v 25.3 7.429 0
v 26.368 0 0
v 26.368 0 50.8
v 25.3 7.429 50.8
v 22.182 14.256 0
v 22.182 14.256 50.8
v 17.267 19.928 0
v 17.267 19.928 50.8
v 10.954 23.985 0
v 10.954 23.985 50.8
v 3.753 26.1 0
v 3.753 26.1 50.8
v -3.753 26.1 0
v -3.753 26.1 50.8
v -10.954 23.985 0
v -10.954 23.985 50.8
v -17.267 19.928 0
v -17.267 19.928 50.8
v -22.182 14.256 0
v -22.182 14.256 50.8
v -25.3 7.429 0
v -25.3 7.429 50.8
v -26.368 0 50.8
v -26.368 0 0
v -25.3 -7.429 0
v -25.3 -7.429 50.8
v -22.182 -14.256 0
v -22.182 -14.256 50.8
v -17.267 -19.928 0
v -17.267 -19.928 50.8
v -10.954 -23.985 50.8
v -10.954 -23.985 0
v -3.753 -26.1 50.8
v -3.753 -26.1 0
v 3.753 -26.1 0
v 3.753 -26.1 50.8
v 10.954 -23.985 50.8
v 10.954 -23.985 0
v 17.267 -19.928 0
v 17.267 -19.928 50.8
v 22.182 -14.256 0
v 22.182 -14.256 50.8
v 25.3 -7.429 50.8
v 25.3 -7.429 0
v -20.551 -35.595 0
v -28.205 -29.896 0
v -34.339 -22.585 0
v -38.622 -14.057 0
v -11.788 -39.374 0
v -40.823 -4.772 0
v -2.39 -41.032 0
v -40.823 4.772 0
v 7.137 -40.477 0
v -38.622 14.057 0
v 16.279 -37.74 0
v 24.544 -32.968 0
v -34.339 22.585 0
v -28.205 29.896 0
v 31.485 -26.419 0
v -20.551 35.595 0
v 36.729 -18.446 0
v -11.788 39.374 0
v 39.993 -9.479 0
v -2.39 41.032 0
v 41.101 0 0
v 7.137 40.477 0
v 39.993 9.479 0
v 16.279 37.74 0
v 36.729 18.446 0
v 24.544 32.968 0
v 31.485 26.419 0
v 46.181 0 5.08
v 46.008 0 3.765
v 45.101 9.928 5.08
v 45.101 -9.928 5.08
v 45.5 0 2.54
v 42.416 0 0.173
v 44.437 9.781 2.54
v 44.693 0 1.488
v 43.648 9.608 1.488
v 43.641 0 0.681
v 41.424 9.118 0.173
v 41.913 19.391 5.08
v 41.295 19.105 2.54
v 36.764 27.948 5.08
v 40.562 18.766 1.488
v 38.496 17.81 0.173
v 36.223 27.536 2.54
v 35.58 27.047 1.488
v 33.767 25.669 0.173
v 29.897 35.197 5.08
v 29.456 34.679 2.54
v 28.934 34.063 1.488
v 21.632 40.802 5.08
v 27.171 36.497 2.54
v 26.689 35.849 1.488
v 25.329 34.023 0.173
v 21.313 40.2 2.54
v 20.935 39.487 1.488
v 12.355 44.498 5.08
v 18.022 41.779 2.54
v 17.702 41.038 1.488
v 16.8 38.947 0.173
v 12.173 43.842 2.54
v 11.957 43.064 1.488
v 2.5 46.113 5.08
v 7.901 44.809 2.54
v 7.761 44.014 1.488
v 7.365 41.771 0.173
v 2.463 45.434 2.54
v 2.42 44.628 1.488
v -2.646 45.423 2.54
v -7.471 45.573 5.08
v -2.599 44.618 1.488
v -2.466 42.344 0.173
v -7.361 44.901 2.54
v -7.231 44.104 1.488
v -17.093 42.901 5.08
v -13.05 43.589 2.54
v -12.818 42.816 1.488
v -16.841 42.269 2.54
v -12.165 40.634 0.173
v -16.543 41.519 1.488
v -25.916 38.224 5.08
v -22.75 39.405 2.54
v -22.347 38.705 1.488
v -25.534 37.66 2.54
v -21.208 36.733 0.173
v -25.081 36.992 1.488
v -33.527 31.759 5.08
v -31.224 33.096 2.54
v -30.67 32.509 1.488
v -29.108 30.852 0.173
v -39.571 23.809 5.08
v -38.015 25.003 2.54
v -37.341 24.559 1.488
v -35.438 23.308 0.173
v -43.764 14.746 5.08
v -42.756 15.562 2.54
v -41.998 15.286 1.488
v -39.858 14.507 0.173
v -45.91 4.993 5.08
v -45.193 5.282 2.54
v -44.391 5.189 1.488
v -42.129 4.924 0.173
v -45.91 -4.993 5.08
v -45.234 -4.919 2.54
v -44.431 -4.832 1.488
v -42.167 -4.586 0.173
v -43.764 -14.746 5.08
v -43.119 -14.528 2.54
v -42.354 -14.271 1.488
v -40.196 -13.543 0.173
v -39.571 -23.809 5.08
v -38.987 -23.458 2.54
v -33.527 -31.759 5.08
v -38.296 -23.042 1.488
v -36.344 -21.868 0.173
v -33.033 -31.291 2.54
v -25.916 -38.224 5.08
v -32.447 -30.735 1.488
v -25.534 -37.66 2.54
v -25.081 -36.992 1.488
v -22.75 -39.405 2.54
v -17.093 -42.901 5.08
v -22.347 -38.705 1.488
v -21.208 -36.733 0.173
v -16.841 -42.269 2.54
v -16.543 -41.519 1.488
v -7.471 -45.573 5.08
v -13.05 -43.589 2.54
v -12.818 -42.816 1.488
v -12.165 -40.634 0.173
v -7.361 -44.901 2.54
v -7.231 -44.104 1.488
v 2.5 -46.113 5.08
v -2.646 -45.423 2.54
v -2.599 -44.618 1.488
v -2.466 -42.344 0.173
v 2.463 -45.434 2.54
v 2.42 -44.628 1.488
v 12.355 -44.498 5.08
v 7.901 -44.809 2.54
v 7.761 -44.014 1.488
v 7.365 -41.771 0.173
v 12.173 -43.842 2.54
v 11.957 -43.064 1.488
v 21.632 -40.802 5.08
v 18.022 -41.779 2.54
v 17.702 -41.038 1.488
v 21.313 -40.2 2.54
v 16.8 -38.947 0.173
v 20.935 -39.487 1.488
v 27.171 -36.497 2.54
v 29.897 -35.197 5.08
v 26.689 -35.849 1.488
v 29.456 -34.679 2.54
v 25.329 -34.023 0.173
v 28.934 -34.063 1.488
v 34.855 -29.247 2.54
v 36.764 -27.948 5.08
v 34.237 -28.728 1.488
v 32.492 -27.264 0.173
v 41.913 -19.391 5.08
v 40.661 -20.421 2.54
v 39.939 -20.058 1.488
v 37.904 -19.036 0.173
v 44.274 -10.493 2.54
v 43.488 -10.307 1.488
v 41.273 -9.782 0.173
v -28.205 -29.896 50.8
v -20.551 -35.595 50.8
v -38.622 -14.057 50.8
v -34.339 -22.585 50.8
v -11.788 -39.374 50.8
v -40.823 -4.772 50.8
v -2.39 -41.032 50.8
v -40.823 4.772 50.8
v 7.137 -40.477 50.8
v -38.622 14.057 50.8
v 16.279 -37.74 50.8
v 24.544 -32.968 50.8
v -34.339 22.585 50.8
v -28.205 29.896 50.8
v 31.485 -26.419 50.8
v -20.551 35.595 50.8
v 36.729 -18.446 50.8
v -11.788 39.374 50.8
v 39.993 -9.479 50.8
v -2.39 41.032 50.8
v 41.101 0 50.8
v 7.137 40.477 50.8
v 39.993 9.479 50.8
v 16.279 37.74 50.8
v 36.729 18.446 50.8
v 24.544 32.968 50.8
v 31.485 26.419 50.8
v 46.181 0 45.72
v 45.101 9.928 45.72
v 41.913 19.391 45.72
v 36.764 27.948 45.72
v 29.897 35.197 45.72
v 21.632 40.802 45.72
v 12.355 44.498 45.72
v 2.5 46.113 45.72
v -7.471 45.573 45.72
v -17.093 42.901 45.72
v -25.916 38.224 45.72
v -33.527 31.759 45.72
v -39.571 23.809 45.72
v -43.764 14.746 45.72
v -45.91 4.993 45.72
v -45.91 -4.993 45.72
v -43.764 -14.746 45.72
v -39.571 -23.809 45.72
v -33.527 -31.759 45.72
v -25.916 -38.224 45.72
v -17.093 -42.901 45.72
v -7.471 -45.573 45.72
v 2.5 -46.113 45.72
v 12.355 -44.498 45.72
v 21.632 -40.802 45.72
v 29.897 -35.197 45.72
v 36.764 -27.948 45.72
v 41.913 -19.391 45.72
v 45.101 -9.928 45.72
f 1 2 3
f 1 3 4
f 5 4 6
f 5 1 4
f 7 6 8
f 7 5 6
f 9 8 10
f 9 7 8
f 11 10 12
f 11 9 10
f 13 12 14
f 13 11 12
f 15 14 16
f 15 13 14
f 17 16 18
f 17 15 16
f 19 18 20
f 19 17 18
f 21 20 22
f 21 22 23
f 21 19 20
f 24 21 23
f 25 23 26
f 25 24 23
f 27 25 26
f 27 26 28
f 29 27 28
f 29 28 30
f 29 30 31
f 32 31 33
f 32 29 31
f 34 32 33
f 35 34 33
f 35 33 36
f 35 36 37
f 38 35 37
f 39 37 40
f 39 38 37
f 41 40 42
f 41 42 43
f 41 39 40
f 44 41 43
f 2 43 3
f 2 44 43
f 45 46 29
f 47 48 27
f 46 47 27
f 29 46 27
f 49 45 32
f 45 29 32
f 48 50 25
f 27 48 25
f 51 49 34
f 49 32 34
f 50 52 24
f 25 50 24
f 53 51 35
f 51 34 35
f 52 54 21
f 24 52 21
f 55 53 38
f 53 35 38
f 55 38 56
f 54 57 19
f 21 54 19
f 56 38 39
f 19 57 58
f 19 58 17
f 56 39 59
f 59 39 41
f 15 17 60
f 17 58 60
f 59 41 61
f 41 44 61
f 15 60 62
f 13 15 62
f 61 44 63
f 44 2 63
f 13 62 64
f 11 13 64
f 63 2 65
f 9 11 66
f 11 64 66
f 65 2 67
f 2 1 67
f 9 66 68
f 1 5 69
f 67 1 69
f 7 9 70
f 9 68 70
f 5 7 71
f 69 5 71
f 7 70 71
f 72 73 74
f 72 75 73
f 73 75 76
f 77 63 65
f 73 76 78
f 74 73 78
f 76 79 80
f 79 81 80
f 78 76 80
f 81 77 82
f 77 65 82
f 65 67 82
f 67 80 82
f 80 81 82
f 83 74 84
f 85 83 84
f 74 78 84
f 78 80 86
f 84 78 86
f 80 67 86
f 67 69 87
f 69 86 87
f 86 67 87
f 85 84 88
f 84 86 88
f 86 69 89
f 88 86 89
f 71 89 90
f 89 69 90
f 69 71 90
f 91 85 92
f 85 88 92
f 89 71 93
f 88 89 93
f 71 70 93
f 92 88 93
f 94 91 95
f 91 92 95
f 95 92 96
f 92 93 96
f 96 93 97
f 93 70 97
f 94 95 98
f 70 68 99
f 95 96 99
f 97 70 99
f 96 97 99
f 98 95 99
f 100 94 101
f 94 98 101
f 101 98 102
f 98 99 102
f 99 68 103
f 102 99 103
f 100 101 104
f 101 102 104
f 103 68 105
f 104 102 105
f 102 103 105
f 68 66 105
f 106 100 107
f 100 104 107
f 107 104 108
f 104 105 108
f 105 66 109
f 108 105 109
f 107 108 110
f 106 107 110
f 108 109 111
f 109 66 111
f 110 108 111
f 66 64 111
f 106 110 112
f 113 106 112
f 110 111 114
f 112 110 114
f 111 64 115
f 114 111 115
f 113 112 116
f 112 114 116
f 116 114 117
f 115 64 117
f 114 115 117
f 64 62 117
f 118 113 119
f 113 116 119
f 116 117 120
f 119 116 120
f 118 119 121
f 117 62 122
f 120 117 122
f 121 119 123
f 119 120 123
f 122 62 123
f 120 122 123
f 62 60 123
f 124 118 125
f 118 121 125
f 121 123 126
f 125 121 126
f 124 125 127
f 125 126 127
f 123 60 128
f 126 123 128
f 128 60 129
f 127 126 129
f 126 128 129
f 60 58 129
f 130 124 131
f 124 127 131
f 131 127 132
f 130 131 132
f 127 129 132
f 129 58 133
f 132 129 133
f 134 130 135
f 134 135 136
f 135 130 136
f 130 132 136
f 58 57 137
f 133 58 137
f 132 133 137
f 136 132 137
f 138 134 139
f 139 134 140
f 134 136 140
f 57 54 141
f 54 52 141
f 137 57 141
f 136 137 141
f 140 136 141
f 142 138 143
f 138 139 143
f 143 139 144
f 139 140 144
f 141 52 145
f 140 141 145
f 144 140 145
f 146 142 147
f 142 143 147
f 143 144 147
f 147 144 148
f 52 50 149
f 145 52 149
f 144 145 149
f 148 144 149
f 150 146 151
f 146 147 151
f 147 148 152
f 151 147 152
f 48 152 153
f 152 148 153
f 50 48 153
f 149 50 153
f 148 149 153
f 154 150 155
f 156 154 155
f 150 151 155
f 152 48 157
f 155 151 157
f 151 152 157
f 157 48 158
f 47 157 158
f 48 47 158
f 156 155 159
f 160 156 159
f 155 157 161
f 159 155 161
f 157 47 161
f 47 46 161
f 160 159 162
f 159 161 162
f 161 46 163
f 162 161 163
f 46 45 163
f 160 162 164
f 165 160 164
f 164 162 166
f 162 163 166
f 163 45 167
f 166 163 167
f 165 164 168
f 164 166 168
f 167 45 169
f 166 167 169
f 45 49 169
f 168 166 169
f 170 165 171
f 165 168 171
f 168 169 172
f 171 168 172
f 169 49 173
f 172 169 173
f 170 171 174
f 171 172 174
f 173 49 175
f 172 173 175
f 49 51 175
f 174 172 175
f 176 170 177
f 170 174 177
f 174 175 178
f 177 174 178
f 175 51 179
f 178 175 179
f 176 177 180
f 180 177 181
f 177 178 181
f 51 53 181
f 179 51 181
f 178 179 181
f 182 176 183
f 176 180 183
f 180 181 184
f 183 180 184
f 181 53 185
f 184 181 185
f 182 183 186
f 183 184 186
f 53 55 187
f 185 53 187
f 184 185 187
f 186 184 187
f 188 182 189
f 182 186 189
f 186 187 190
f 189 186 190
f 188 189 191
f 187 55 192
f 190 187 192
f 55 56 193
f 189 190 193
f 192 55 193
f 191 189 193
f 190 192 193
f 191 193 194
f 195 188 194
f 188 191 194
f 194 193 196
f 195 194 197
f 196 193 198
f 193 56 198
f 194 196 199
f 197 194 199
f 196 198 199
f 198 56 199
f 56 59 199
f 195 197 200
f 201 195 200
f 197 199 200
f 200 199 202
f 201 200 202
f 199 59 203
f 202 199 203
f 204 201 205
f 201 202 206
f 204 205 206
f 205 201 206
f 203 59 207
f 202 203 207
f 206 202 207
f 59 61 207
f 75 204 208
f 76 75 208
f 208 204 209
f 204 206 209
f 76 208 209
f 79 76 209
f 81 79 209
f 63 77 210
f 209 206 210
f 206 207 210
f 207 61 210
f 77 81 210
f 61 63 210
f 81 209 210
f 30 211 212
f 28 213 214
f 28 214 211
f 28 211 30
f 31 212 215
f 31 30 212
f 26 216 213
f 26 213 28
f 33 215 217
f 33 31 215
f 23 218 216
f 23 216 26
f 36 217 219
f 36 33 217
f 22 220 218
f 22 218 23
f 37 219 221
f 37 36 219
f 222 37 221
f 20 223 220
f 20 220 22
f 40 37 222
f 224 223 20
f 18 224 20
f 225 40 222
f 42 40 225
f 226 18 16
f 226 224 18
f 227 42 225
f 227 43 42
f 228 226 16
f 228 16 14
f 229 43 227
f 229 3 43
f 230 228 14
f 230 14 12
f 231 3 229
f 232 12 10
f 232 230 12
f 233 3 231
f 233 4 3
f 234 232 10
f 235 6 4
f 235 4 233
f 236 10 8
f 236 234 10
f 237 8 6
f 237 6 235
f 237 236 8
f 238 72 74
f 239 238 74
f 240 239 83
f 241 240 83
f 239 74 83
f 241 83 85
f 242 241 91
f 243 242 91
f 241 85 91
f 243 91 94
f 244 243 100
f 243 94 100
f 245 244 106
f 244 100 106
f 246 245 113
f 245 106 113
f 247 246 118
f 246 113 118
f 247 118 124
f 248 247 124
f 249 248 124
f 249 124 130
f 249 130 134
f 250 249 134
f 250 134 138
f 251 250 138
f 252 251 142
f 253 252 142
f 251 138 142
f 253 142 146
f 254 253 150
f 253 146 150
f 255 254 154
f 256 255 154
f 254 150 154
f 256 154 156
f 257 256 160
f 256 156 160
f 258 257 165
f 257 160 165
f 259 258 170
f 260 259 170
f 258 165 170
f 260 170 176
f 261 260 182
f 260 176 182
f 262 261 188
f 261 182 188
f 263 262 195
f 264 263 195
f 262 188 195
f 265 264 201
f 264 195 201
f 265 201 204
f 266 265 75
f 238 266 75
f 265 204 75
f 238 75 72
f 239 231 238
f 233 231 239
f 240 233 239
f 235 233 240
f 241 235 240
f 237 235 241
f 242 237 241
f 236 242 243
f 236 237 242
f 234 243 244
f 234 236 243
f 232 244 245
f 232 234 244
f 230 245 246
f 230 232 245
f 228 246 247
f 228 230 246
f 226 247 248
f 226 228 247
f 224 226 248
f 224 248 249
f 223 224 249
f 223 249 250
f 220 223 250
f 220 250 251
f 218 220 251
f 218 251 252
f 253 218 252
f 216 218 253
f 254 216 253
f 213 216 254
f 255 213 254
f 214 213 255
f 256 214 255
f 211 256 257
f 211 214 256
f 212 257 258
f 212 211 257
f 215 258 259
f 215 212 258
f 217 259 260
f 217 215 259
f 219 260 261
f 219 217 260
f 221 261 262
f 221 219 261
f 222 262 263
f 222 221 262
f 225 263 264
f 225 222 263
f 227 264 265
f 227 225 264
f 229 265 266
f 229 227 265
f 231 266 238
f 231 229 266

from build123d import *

# Parameters (mm, degrees)
F0_R     = 46.181054
F0_R_2   = 26.367937
F1_DEPTH = 50.8
F2_SIZE  = 5.08
F3_R     = 5.08


with BuildPart() as f1:
    # F0 (on Top) → F1 (new body)
    with BuildSketch(Plane.XY):
        Circle(F0_R)
        Circle(F0_R_2, mode=Mode.SUBTRACT)
    extrude(amount=F1_DEPTH)

    # F2
    f2_edges = [f1.edges().sort_by_distance(p)[0] for p in [
        (-46.181054, 0, 50.8),
    ]]
    chamfer(f2_edges, length=F2_SIZE)

    # F3
    f3_edges = [f1.edges().sort_by_distance(p)[0] for p in [
        (-46.181054, 0, 0),
    ]]
    fillet(f3_edges, radius=F3_R)


solid = f1.part
